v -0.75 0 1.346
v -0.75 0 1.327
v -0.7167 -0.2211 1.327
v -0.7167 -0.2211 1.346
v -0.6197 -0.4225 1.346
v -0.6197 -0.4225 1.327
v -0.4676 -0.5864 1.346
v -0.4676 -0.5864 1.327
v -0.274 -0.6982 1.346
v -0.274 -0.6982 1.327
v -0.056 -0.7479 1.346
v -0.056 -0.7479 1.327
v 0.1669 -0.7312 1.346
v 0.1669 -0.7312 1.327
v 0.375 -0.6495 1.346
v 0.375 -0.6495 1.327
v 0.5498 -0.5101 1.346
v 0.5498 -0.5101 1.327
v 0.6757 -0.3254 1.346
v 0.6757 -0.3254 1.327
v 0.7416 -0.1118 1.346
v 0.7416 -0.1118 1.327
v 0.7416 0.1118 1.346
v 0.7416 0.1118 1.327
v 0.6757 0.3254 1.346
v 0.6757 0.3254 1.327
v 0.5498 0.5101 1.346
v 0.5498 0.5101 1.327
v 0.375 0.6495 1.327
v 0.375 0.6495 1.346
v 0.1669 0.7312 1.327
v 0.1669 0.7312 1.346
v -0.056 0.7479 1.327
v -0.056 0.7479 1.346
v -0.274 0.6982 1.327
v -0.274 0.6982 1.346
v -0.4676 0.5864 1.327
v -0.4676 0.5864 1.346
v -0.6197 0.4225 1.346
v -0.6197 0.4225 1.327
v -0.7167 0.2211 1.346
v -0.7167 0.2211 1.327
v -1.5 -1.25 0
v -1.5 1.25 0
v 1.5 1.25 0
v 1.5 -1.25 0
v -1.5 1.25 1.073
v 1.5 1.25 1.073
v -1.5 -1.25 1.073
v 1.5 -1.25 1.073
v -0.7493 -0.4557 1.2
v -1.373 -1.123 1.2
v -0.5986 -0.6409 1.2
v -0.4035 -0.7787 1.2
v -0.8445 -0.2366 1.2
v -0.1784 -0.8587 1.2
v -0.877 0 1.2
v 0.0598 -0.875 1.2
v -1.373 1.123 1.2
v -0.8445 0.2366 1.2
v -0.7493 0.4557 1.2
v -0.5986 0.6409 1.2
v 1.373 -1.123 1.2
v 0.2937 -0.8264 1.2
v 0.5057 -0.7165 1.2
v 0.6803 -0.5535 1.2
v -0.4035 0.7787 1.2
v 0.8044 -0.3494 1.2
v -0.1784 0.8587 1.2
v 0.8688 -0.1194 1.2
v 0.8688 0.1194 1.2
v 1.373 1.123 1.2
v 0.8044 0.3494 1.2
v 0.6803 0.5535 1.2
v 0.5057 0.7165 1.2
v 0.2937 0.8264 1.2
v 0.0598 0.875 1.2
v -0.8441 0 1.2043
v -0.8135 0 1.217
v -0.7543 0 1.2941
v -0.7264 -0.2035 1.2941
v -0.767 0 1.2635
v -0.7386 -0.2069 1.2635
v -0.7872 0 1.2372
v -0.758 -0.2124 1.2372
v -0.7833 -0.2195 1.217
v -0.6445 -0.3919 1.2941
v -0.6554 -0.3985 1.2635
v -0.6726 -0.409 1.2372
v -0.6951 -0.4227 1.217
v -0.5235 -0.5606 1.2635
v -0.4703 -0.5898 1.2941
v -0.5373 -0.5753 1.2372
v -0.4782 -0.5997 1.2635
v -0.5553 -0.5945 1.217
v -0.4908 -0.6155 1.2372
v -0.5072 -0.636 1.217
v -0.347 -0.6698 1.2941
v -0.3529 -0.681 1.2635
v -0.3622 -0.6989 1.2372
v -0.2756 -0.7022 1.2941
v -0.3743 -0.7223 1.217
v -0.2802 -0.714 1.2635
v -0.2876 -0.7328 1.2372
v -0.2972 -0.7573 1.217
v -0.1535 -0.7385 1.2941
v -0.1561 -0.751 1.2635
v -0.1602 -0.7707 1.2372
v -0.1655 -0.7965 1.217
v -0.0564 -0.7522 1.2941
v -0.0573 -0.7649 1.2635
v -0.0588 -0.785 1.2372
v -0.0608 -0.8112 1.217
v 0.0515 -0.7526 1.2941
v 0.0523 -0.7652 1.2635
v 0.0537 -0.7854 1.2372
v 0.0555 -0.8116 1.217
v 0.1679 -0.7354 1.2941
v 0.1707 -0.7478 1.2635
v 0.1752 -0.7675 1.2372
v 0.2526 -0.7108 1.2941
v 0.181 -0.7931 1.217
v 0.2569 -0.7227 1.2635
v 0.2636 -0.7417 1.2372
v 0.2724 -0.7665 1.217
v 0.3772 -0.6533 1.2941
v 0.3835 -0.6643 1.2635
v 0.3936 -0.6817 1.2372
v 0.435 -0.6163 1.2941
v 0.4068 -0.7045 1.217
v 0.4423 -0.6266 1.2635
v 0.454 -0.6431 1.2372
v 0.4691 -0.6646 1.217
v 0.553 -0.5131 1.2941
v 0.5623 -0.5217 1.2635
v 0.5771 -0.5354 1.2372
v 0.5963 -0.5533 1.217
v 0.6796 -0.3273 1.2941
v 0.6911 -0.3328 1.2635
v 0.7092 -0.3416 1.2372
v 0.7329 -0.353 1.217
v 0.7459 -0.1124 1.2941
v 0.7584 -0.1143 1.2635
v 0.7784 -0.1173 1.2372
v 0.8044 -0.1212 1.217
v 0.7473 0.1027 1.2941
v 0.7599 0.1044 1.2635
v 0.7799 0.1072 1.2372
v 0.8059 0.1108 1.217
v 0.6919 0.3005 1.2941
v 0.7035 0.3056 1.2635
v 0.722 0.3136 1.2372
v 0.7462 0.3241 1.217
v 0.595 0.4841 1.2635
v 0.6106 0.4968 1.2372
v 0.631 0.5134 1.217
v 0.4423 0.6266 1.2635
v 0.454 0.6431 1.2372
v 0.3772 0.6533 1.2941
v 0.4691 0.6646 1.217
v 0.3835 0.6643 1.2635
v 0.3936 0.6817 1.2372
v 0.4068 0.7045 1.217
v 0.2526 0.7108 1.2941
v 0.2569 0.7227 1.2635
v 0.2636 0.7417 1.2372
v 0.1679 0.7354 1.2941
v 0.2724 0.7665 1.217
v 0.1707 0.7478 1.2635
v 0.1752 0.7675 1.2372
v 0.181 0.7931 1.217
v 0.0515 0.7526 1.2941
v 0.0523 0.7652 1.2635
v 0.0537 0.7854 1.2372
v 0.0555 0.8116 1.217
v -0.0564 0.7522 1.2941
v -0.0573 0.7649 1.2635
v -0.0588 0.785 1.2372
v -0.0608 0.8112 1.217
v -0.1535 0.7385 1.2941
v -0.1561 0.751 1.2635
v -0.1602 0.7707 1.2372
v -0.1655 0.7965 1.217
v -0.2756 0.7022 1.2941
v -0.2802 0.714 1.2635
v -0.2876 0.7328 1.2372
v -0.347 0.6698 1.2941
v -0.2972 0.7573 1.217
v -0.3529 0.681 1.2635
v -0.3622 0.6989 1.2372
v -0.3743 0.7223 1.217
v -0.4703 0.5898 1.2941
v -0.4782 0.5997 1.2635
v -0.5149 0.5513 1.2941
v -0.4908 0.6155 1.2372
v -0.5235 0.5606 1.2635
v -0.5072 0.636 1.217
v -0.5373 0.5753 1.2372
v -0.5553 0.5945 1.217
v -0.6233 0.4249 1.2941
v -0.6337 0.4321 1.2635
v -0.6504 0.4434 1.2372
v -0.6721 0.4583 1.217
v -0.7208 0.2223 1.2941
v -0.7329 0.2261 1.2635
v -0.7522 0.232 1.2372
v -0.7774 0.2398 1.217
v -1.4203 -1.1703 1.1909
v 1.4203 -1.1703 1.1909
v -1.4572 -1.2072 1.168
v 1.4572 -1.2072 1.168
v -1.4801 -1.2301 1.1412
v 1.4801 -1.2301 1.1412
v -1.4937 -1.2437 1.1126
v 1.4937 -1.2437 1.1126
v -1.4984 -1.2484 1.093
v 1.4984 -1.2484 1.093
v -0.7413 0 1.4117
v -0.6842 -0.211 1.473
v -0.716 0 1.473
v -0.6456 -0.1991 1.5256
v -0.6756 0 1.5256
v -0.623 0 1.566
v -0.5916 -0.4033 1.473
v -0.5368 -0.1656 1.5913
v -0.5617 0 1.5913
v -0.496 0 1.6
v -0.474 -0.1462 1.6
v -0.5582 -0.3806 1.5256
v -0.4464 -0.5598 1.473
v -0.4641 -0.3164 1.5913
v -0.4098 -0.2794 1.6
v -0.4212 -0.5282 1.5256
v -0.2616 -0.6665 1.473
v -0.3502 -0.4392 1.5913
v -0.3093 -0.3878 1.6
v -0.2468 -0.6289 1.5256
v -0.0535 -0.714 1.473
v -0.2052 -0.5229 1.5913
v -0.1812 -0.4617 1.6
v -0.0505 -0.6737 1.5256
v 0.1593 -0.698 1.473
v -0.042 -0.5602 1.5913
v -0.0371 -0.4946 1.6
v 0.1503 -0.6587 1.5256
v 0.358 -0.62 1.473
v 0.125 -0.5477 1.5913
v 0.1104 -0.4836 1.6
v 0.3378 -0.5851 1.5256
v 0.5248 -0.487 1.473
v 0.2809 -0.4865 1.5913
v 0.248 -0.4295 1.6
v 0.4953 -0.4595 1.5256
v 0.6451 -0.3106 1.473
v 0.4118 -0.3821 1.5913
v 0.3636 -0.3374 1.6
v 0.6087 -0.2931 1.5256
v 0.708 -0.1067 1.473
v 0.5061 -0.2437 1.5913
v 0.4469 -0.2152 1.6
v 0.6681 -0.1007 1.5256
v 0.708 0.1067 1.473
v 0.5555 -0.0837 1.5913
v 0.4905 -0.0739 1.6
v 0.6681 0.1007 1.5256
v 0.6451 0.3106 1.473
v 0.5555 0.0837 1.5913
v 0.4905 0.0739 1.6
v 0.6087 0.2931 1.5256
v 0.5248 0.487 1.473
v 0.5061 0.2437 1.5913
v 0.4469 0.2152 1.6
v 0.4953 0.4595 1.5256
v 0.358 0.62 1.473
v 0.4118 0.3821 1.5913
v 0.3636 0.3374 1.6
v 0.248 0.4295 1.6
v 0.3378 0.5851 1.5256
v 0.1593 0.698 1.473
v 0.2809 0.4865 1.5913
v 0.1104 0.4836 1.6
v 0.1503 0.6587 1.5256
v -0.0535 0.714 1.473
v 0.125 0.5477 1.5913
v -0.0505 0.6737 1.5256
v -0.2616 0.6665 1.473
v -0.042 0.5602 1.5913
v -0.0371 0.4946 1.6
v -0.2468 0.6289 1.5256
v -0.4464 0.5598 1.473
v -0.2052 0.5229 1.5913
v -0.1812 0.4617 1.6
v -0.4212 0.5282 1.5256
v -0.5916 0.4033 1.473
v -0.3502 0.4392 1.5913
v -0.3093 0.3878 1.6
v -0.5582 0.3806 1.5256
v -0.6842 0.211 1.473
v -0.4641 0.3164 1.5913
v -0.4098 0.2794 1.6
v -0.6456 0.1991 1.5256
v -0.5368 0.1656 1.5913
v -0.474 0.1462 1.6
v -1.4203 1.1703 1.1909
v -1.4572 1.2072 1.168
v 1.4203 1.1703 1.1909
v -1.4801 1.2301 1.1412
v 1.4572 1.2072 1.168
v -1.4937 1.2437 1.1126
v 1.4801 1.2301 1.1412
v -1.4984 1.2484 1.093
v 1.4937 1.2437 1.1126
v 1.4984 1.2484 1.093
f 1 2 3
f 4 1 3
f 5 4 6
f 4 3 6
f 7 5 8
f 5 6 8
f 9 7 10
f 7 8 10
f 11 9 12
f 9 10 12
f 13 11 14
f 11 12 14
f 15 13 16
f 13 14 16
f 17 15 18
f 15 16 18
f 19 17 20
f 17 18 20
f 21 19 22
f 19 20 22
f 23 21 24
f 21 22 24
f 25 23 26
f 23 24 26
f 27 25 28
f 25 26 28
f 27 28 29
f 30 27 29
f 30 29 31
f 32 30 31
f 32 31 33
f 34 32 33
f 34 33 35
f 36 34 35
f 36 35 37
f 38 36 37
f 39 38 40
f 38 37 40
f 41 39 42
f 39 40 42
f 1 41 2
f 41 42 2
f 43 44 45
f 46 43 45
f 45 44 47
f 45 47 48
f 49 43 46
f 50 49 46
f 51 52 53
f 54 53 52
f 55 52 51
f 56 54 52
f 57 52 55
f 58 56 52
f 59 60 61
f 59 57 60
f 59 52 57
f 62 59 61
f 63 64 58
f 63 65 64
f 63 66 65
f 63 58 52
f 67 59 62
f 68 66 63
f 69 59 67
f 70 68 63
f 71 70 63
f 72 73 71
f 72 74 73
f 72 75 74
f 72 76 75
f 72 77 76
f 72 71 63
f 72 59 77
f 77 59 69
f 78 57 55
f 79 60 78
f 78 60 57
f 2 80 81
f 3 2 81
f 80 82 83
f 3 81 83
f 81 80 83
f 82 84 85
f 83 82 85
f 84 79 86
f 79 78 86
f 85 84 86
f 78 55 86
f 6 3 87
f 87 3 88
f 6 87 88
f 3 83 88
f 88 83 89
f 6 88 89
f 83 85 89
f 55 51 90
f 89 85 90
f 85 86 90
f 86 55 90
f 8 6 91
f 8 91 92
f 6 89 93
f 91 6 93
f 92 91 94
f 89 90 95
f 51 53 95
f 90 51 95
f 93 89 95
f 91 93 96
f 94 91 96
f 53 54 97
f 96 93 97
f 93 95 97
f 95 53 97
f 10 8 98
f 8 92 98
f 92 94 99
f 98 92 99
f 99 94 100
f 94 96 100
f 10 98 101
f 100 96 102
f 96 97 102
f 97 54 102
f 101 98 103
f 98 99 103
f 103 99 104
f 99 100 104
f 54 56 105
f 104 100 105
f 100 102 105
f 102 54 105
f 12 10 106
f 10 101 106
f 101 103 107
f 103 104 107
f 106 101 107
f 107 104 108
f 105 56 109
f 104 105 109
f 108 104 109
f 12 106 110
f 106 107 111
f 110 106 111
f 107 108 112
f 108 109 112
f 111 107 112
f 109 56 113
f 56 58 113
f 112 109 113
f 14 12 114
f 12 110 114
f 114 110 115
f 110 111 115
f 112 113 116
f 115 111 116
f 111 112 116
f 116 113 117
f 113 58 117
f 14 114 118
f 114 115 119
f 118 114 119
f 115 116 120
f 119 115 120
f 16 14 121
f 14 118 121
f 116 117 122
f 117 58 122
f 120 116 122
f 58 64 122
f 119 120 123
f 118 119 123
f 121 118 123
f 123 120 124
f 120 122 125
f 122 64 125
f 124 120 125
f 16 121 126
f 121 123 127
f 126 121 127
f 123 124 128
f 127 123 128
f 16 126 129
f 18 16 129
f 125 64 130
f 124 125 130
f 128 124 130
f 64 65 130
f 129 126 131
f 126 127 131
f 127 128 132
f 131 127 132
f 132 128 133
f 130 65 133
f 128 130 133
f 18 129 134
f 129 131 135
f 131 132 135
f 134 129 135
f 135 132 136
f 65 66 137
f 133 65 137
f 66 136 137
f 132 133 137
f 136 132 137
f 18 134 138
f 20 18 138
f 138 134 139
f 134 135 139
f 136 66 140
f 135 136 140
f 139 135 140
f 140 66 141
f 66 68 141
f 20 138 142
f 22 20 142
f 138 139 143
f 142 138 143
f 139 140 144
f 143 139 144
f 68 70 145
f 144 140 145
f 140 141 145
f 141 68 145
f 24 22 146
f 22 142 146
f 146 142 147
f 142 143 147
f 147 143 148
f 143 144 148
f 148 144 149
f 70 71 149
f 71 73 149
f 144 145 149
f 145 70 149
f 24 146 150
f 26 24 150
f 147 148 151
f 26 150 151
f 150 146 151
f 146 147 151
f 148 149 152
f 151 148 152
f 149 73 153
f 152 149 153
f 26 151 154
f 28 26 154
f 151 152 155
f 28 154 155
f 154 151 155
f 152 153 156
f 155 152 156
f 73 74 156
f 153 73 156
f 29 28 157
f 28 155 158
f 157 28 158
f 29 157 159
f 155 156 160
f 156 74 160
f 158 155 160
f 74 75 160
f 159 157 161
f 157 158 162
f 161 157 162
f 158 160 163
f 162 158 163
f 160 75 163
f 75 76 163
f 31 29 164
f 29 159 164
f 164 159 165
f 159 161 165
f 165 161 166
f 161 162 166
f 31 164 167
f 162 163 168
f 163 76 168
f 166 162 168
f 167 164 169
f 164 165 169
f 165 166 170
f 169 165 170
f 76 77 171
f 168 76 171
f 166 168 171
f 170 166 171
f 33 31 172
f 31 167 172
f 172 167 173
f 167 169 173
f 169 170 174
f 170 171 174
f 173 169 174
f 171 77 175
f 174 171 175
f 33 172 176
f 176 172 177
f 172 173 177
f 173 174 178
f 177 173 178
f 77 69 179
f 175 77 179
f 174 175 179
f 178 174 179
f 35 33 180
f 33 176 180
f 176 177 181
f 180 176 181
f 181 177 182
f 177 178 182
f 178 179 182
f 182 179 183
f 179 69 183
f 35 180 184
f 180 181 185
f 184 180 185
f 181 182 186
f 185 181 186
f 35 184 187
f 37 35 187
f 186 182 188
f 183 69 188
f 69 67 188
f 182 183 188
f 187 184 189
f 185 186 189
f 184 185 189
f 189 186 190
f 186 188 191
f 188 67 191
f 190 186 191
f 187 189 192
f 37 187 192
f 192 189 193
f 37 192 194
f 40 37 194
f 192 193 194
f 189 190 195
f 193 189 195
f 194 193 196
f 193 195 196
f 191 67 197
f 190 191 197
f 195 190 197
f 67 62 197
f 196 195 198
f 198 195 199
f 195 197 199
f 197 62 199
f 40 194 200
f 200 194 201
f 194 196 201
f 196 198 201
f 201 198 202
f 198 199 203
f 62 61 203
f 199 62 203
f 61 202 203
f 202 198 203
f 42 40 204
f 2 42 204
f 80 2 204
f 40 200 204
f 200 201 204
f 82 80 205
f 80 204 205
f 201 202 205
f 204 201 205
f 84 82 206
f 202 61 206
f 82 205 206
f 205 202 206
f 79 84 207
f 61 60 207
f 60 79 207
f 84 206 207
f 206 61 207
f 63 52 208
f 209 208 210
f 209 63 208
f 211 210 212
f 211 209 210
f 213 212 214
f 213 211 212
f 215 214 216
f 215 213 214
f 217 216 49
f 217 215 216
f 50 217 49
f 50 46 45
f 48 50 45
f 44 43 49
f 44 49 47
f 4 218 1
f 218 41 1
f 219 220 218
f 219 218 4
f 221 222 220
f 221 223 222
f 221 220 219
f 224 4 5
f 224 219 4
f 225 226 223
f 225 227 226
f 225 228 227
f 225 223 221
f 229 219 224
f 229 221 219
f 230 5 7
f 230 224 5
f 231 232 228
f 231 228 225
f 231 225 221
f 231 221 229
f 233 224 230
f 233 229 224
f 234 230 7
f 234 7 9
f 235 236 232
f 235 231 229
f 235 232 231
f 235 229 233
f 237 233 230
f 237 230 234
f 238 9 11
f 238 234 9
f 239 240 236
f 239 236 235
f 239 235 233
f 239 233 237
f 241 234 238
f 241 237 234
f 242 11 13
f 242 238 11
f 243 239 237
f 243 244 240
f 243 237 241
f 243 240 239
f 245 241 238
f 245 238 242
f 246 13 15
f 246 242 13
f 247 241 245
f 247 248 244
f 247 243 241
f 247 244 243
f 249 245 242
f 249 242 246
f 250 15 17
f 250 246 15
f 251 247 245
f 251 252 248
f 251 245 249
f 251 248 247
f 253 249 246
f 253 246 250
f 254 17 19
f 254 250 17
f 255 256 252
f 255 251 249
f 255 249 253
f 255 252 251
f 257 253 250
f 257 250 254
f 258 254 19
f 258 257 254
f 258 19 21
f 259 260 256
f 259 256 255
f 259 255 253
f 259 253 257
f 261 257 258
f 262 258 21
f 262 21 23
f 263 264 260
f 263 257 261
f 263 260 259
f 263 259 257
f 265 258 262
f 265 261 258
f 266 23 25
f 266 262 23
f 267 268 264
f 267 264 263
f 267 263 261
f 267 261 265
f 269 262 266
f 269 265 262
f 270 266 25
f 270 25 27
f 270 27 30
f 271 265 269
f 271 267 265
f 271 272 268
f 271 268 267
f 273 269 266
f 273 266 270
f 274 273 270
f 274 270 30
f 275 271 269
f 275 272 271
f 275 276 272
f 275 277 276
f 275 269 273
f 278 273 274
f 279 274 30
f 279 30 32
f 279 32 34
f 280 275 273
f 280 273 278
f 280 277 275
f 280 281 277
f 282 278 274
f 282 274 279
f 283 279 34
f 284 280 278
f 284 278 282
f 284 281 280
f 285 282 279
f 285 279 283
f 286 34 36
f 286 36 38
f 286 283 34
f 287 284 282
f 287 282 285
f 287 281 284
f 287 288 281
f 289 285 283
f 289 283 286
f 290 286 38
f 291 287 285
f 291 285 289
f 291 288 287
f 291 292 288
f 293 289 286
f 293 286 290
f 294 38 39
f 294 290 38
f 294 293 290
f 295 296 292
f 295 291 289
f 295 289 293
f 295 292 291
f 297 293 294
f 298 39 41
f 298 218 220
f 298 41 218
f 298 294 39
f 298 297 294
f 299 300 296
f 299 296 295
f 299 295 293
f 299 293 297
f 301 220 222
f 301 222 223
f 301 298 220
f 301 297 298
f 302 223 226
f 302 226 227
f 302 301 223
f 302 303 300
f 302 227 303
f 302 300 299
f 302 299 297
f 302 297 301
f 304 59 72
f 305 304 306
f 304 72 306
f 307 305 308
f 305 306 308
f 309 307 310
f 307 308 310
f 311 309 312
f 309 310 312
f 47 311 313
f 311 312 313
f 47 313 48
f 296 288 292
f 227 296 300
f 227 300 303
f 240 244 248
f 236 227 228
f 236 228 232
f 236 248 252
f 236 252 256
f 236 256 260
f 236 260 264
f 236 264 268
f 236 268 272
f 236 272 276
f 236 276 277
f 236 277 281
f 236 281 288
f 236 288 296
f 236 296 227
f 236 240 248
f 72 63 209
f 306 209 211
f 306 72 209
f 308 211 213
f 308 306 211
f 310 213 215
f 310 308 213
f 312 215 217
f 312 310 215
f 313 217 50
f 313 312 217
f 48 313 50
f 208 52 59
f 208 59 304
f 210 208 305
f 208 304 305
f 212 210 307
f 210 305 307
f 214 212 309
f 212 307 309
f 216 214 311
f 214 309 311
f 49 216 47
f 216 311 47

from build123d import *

# Parameters (mm, degrees)
SKETCH1_W           = 3
SKETCH1_H           = 2.5
BOSS_EXTRUDE1_DEPTH = 1.2
SKETCH2_R           = 0.75
BOSS_EXTRUDE2_DEPTH = 0.4
FILLET1_R           = 0.254
FILLET2_R           = 0.127


with BuildPart() as part:
    # Sketch1 → Boss-Extrude1 (new body)
    with BuildSketch(Plane.XY):
        Rectangle(SKETCH1_W, SKETCH1_H)
    extrude(amount=BOSS_EXTRUDE1_DEPTH)

    # Sketch2 → Boss-Extrude2 (add)
    with BuildSketch(Plane.XY.offset(1.2)):
        with Locations(Location((0, 0, 0), (0, 0, 180))):
            Circle(SKETCH2_R)
    extrude(amount=BOSS_EXTRUDE2_DEPTH)

    # Fillet1
    fillet1_edges = [part.edges().sort_by_distance(p)[0] for p in [
        (0.75, 0, 1.6),
    ]]
    fillet(fillet1_edges, radius=FILLET1_R)

    # Fillet2
    fillet2_edges = [part.edges().sort_by_distance(p)[0] for p in [
        (-1.5, 0, 1.2),
        (0, -1.25, 1.2),
        (0.75, 0, 1.2),
        (1.5, 0, 1.2),
        (0, 1.25, 1.2),
    ]]
    fillet(fillet2_edges, radius=FILLET2_R)


solid = part.part
